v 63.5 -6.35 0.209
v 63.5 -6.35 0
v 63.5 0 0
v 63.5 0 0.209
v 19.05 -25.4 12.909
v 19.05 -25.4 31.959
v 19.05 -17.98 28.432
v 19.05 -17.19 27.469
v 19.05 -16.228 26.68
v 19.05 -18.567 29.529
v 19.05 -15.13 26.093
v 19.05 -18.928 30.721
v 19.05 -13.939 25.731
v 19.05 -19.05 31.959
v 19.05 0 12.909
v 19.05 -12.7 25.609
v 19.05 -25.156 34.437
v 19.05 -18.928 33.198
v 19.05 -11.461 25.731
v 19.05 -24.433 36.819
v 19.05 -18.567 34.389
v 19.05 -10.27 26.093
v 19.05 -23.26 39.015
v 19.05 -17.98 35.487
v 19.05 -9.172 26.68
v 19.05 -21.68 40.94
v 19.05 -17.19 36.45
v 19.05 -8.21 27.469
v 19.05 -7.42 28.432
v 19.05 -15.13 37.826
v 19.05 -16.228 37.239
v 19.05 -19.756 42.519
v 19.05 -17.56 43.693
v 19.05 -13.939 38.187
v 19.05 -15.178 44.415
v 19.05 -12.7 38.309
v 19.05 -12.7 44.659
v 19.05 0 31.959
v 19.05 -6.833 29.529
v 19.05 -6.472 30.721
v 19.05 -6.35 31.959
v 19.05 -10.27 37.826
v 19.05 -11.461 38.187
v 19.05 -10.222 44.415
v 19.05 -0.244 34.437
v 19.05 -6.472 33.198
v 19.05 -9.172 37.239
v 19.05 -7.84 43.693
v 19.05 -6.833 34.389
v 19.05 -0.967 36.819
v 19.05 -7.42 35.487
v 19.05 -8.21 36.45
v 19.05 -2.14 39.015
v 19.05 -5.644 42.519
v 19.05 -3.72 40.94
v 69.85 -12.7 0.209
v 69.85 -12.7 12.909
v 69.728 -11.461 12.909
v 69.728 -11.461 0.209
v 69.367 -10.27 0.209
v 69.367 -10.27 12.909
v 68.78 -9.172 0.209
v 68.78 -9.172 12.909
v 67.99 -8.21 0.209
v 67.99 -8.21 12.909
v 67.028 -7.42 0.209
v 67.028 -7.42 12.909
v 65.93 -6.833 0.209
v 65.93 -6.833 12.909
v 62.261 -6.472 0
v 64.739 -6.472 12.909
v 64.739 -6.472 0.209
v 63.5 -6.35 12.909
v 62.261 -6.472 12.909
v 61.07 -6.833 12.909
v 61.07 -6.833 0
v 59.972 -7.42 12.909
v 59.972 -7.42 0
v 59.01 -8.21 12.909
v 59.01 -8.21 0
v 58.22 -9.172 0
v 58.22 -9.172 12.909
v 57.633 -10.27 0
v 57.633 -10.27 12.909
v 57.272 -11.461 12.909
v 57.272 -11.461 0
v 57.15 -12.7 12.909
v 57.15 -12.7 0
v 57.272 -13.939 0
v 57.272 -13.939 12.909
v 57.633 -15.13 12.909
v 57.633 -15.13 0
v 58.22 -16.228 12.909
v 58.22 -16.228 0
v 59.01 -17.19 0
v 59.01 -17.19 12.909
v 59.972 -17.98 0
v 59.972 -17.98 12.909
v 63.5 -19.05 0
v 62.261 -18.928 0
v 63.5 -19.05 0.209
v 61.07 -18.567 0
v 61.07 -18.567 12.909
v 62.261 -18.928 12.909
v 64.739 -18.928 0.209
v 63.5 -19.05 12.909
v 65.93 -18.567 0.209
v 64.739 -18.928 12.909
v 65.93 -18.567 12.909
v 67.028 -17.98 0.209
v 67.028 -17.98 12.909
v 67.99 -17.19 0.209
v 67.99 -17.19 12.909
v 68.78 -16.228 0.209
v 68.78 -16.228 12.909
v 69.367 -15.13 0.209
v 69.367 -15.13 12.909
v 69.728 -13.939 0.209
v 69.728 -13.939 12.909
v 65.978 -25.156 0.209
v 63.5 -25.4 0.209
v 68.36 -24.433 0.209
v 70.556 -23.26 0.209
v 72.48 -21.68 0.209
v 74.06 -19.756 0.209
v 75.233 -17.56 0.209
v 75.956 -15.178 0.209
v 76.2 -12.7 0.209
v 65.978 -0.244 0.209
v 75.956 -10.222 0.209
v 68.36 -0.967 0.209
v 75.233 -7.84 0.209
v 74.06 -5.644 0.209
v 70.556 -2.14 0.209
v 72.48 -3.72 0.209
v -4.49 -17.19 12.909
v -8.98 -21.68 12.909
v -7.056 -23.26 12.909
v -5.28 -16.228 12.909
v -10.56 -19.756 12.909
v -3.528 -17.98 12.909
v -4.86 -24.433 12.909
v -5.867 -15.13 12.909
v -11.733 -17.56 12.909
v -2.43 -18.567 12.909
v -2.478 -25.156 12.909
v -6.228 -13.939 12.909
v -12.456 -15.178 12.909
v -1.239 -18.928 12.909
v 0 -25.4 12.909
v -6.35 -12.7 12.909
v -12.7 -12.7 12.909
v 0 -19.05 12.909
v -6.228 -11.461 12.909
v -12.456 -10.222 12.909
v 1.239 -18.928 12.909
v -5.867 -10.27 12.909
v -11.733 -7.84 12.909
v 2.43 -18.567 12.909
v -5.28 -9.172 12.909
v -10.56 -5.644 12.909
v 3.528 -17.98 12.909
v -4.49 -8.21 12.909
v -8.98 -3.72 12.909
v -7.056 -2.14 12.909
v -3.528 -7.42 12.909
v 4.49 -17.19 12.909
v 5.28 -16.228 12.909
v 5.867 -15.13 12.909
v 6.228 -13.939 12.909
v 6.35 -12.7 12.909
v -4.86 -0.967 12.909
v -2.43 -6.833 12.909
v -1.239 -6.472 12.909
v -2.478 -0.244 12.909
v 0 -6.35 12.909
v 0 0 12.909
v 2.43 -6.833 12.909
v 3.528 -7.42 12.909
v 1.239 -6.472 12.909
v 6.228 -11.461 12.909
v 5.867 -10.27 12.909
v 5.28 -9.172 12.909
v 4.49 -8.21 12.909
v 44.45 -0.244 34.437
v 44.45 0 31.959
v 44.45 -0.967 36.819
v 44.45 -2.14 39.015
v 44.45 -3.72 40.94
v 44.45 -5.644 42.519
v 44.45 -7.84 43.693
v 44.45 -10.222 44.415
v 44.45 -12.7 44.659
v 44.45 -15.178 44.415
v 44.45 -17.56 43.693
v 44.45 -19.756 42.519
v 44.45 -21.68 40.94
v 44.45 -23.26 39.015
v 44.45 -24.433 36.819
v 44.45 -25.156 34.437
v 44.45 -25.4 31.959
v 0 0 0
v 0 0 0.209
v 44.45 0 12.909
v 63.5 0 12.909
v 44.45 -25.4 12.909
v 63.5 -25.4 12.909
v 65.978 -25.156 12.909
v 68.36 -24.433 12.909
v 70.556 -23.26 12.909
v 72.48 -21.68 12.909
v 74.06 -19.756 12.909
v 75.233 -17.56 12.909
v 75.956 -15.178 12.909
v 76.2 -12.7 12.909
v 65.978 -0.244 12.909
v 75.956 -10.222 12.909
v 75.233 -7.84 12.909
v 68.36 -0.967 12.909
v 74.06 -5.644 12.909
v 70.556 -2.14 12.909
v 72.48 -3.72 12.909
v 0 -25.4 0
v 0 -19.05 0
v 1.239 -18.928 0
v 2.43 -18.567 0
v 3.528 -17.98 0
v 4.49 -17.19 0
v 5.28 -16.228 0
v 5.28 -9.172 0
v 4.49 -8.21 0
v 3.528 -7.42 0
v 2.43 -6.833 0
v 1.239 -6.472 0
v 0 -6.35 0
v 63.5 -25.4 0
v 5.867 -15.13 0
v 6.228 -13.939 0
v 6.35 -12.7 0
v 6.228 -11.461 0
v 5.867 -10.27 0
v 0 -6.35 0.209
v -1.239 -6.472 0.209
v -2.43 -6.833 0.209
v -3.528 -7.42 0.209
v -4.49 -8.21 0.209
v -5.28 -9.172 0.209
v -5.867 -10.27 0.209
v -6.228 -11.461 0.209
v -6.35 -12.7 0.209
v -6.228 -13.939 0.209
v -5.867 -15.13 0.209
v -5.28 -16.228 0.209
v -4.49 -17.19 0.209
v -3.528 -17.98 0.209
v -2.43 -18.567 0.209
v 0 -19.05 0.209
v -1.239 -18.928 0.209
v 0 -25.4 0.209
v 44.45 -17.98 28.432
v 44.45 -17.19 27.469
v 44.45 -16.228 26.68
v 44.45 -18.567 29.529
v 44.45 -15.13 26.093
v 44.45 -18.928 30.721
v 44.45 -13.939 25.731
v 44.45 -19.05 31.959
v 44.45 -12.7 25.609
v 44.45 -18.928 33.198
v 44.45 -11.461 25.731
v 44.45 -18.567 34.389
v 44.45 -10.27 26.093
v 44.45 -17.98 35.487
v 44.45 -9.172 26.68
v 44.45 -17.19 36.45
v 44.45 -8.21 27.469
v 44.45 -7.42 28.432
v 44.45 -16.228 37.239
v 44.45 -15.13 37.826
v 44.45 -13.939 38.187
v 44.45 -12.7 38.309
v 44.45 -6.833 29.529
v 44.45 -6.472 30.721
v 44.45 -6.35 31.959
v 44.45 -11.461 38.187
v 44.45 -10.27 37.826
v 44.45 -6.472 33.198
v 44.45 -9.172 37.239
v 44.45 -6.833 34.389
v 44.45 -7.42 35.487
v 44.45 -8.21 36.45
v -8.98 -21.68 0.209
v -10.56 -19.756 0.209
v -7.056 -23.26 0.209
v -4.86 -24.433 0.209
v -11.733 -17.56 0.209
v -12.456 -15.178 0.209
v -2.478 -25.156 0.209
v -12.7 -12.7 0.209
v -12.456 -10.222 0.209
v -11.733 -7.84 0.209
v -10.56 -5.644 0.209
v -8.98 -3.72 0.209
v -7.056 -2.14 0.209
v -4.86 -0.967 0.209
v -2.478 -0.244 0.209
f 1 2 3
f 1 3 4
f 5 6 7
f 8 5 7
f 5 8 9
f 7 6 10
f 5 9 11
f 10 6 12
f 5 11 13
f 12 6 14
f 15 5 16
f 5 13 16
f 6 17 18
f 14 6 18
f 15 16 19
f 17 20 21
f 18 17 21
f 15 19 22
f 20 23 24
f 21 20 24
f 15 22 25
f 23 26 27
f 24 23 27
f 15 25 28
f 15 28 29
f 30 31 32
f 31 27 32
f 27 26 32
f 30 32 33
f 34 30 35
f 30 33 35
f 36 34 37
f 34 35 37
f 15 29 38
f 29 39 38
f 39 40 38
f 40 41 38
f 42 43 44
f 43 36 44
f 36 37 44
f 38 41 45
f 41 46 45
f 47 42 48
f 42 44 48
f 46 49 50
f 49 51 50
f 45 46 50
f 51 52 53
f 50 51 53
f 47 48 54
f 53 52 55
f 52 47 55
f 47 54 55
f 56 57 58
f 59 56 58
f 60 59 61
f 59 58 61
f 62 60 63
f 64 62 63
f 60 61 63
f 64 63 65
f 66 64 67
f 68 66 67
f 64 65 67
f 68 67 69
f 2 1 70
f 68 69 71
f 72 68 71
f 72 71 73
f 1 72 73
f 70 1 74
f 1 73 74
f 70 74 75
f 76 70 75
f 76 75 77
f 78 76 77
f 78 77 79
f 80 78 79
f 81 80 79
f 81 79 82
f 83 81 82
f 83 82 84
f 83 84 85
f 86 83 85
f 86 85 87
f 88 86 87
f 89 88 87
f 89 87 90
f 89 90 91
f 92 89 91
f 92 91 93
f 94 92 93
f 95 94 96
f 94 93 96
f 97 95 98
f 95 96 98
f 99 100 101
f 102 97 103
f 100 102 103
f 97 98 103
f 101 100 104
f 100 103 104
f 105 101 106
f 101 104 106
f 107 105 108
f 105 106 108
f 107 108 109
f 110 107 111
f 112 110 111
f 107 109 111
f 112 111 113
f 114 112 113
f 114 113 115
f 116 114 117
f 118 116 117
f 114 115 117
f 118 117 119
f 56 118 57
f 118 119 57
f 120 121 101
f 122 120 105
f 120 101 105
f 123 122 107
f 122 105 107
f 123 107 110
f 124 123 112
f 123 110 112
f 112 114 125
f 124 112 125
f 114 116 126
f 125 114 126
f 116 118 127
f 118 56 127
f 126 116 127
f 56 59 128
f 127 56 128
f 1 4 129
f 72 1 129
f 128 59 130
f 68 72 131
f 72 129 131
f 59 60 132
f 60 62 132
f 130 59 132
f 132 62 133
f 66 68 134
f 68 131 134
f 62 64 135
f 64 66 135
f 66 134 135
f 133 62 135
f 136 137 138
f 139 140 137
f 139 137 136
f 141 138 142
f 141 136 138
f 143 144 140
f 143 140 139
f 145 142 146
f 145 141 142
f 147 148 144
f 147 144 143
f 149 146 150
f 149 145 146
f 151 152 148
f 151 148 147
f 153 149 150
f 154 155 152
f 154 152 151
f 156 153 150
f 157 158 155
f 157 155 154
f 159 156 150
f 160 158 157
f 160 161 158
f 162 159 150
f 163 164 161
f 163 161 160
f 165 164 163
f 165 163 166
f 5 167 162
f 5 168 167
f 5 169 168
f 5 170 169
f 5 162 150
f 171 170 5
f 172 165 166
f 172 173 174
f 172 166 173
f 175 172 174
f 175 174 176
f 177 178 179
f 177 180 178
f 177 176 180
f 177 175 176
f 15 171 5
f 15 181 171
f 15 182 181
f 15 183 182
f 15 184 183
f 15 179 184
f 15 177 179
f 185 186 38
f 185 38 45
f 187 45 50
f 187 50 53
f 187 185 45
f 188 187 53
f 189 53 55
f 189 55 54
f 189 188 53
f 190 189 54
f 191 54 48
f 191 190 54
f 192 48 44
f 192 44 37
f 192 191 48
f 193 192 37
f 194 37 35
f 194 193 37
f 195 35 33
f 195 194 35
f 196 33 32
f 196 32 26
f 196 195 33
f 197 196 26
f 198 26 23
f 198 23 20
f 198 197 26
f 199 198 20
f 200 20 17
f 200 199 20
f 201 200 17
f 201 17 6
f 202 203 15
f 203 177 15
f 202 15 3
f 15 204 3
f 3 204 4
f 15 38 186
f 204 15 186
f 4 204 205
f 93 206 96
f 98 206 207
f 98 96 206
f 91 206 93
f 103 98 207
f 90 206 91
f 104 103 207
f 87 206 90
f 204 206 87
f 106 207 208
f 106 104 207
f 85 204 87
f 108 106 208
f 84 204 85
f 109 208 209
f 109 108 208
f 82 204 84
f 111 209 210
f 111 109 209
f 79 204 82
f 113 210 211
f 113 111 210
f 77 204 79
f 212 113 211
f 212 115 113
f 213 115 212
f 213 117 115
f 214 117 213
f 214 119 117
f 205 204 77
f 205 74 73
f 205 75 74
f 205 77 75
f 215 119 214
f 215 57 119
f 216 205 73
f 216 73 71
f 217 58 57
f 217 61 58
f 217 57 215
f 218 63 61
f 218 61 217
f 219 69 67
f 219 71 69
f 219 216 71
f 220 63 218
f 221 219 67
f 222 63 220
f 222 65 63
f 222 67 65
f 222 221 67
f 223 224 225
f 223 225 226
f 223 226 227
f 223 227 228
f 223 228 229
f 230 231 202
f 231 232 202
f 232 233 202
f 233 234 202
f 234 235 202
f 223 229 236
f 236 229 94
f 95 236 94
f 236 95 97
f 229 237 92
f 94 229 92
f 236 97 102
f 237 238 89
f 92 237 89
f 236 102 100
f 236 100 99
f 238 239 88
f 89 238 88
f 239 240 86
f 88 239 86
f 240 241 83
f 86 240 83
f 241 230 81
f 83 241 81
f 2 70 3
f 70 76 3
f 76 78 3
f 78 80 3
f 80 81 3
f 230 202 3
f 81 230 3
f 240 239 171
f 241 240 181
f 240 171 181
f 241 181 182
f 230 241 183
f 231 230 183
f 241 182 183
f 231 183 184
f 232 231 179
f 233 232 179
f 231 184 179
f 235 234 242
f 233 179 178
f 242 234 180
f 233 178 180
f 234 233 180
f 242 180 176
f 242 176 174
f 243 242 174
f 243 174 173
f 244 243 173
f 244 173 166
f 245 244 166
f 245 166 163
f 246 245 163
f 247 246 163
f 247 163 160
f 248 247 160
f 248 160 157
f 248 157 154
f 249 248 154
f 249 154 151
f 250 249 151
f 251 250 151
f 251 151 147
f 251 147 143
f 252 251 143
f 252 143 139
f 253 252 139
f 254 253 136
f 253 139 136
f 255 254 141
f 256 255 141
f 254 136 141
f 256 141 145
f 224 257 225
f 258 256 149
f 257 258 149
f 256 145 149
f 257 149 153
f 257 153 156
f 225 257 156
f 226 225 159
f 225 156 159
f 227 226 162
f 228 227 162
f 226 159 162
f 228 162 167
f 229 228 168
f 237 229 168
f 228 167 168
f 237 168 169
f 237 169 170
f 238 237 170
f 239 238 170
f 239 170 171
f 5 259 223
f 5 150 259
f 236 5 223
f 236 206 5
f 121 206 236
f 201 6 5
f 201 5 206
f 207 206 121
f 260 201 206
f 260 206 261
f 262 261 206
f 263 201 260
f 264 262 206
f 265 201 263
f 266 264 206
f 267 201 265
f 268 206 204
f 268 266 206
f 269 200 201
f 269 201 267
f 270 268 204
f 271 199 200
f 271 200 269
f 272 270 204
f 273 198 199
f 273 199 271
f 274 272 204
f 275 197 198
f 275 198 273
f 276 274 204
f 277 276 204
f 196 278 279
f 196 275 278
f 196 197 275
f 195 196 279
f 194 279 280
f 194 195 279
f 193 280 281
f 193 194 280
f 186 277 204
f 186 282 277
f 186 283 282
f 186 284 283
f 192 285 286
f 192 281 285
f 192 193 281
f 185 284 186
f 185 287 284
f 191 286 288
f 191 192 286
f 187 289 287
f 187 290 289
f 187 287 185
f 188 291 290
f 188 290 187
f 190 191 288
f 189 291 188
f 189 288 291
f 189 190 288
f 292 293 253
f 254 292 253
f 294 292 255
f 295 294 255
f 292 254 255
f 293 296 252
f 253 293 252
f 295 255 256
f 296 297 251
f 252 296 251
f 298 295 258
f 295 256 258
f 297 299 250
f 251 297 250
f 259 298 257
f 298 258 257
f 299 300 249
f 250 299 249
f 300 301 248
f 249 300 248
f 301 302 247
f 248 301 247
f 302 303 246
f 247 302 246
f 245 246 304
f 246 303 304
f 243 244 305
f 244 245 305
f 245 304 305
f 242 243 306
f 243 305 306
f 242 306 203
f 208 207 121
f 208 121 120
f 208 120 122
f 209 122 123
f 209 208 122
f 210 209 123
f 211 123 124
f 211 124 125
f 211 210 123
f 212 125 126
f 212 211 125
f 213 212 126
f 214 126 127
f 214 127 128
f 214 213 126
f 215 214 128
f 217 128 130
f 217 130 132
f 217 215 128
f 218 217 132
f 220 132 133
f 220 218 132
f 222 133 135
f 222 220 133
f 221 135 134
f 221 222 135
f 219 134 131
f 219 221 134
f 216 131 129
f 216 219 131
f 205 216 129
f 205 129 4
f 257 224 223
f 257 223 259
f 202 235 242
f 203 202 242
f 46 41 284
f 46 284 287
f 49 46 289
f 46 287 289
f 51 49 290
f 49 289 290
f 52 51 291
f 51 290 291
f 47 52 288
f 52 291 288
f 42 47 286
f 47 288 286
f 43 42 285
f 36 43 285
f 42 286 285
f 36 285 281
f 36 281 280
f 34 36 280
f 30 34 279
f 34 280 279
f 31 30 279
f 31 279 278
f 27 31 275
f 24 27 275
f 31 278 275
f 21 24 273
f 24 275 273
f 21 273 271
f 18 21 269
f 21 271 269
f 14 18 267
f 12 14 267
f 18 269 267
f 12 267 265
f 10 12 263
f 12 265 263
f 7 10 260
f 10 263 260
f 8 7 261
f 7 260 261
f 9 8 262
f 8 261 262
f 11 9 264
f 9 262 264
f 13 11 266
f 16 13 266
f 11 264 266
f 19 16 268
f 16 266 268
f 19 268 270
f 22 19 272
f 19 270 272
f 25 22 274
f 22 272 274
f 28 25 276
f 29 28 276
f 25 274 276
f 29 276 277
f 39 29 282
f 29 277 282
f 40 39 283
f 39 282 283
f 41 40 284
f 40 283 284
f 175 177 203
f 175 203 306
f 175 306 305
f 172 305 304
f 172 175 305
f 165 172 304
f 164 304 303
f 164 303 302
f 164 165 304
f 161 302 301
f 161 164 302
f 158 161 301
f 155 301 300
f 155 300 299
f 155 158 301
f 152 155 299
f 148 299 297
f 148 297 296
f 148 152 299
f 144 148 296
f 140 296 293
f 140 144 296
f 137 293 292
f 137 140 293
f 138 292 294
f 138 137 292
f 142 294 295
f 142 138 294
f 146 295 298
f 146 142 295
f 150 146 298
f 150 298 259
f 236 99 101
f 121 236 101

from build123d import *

# Parameters (mm, degrees)
F0_W      = 63.5
F0_H      = 38.1
F1_DEPTH  = 25.4
F3_DEPTH  = 25.4
F5_DEPTH  = 25.4
F7_DEPTH  = 12.7
F9_DEPTH  = 12.7
F10_R     = 6.35
F11_DEPTH = 25.4
F12_R     = 6.35
F13_DEPTH = 25.4
F14_R     = 6.35
F15_DEPTH = 25.4


with BuildPart() as f1:
    # F0 (on Front) → F1 (new body)
    with BuildSketch(Plane.XZ):
        with Locations((31.75, 19.05)):
            Rectangle(F0_W, F0_H)
    extrude(amount=F1_DEPTH)

    # F2 (on face) → F3 (cut)
    with BuildSketch(Plane.XZ.offset(25.4)):
        Polygon((0, 38.1), (0, 12.909415), (19.05, 12.909415), (19.05, 31.959415), (44.45, 31.959415), (44.45, 12.909415), (63.5, 12.909415), (63.5, 38.1), align=None)
    extrude(amount=-F3_DEPTH, mode=Mode.SUBTRACT)

    # F4 (on face) → F5 (join)
    with BuildSketch(Plane.YZ.offset(44.45)):
        with BuildLine():
            Line((-25.4, 31.959415), (0, 31.959415))
            ThreePointArc((0, 31.959415), (-12.7, 44.659415), (-25.4, 31.959415))
        make_face()
    extrude(amount=-F5_DEPTH)

    # F6 (on face) → F7 (join)
    with BuildSketch(Plane.XY.offset(12.909415)):
        with BuildLine():
            Line((0, -25.4), (0, 0))
            ThreePointArc((0, 0), (-12.7, -12.7), (0, -25.4))
        make_face()
    extrude(amount=-F7_DEPTH)

    # F8 (on face) → F9 (join)
    with BuildSketch(Plane.XY.offset(12.909415)):
        with BuildLine():
            Line((63.5, 0), (63.5, -25.4))
            ThreePointArc((63.5, -25.4), (76.2, -12.7), (63.5, 0))
        make_face()
    extrude(amount=-F9_DEPTH)

    # F10 (on face) → F11 (cut)
    with BuildSketch(Plane.YZ.offset(44.45)):
        with Locations((-12.7, 31.959415)):
            Circle(F10_R)
    extrude(amount=-F11_DEPTH, mode=Mode.SUBTRACT)

    # F12 (on face) → F13 (cut)
    with BuildSketch(Plane.XY.offset(12.909415)):
        with Locations((63.5, -12.7)):
            Circle(F12_R)
    extrude(amount=-F13_DEPTH, mode=Mode.SUBTRACT)

    # F14 (on face) → F15 (cut)
    with BuildSketch(Plane.XY.offset(12.909415)):
        with Locations((0, -12.7)):
            Circle(F14_R)
    extrude(amount=-F15_DEPTH, mode=Mode.SUBTRACT)


solid = f1.part
